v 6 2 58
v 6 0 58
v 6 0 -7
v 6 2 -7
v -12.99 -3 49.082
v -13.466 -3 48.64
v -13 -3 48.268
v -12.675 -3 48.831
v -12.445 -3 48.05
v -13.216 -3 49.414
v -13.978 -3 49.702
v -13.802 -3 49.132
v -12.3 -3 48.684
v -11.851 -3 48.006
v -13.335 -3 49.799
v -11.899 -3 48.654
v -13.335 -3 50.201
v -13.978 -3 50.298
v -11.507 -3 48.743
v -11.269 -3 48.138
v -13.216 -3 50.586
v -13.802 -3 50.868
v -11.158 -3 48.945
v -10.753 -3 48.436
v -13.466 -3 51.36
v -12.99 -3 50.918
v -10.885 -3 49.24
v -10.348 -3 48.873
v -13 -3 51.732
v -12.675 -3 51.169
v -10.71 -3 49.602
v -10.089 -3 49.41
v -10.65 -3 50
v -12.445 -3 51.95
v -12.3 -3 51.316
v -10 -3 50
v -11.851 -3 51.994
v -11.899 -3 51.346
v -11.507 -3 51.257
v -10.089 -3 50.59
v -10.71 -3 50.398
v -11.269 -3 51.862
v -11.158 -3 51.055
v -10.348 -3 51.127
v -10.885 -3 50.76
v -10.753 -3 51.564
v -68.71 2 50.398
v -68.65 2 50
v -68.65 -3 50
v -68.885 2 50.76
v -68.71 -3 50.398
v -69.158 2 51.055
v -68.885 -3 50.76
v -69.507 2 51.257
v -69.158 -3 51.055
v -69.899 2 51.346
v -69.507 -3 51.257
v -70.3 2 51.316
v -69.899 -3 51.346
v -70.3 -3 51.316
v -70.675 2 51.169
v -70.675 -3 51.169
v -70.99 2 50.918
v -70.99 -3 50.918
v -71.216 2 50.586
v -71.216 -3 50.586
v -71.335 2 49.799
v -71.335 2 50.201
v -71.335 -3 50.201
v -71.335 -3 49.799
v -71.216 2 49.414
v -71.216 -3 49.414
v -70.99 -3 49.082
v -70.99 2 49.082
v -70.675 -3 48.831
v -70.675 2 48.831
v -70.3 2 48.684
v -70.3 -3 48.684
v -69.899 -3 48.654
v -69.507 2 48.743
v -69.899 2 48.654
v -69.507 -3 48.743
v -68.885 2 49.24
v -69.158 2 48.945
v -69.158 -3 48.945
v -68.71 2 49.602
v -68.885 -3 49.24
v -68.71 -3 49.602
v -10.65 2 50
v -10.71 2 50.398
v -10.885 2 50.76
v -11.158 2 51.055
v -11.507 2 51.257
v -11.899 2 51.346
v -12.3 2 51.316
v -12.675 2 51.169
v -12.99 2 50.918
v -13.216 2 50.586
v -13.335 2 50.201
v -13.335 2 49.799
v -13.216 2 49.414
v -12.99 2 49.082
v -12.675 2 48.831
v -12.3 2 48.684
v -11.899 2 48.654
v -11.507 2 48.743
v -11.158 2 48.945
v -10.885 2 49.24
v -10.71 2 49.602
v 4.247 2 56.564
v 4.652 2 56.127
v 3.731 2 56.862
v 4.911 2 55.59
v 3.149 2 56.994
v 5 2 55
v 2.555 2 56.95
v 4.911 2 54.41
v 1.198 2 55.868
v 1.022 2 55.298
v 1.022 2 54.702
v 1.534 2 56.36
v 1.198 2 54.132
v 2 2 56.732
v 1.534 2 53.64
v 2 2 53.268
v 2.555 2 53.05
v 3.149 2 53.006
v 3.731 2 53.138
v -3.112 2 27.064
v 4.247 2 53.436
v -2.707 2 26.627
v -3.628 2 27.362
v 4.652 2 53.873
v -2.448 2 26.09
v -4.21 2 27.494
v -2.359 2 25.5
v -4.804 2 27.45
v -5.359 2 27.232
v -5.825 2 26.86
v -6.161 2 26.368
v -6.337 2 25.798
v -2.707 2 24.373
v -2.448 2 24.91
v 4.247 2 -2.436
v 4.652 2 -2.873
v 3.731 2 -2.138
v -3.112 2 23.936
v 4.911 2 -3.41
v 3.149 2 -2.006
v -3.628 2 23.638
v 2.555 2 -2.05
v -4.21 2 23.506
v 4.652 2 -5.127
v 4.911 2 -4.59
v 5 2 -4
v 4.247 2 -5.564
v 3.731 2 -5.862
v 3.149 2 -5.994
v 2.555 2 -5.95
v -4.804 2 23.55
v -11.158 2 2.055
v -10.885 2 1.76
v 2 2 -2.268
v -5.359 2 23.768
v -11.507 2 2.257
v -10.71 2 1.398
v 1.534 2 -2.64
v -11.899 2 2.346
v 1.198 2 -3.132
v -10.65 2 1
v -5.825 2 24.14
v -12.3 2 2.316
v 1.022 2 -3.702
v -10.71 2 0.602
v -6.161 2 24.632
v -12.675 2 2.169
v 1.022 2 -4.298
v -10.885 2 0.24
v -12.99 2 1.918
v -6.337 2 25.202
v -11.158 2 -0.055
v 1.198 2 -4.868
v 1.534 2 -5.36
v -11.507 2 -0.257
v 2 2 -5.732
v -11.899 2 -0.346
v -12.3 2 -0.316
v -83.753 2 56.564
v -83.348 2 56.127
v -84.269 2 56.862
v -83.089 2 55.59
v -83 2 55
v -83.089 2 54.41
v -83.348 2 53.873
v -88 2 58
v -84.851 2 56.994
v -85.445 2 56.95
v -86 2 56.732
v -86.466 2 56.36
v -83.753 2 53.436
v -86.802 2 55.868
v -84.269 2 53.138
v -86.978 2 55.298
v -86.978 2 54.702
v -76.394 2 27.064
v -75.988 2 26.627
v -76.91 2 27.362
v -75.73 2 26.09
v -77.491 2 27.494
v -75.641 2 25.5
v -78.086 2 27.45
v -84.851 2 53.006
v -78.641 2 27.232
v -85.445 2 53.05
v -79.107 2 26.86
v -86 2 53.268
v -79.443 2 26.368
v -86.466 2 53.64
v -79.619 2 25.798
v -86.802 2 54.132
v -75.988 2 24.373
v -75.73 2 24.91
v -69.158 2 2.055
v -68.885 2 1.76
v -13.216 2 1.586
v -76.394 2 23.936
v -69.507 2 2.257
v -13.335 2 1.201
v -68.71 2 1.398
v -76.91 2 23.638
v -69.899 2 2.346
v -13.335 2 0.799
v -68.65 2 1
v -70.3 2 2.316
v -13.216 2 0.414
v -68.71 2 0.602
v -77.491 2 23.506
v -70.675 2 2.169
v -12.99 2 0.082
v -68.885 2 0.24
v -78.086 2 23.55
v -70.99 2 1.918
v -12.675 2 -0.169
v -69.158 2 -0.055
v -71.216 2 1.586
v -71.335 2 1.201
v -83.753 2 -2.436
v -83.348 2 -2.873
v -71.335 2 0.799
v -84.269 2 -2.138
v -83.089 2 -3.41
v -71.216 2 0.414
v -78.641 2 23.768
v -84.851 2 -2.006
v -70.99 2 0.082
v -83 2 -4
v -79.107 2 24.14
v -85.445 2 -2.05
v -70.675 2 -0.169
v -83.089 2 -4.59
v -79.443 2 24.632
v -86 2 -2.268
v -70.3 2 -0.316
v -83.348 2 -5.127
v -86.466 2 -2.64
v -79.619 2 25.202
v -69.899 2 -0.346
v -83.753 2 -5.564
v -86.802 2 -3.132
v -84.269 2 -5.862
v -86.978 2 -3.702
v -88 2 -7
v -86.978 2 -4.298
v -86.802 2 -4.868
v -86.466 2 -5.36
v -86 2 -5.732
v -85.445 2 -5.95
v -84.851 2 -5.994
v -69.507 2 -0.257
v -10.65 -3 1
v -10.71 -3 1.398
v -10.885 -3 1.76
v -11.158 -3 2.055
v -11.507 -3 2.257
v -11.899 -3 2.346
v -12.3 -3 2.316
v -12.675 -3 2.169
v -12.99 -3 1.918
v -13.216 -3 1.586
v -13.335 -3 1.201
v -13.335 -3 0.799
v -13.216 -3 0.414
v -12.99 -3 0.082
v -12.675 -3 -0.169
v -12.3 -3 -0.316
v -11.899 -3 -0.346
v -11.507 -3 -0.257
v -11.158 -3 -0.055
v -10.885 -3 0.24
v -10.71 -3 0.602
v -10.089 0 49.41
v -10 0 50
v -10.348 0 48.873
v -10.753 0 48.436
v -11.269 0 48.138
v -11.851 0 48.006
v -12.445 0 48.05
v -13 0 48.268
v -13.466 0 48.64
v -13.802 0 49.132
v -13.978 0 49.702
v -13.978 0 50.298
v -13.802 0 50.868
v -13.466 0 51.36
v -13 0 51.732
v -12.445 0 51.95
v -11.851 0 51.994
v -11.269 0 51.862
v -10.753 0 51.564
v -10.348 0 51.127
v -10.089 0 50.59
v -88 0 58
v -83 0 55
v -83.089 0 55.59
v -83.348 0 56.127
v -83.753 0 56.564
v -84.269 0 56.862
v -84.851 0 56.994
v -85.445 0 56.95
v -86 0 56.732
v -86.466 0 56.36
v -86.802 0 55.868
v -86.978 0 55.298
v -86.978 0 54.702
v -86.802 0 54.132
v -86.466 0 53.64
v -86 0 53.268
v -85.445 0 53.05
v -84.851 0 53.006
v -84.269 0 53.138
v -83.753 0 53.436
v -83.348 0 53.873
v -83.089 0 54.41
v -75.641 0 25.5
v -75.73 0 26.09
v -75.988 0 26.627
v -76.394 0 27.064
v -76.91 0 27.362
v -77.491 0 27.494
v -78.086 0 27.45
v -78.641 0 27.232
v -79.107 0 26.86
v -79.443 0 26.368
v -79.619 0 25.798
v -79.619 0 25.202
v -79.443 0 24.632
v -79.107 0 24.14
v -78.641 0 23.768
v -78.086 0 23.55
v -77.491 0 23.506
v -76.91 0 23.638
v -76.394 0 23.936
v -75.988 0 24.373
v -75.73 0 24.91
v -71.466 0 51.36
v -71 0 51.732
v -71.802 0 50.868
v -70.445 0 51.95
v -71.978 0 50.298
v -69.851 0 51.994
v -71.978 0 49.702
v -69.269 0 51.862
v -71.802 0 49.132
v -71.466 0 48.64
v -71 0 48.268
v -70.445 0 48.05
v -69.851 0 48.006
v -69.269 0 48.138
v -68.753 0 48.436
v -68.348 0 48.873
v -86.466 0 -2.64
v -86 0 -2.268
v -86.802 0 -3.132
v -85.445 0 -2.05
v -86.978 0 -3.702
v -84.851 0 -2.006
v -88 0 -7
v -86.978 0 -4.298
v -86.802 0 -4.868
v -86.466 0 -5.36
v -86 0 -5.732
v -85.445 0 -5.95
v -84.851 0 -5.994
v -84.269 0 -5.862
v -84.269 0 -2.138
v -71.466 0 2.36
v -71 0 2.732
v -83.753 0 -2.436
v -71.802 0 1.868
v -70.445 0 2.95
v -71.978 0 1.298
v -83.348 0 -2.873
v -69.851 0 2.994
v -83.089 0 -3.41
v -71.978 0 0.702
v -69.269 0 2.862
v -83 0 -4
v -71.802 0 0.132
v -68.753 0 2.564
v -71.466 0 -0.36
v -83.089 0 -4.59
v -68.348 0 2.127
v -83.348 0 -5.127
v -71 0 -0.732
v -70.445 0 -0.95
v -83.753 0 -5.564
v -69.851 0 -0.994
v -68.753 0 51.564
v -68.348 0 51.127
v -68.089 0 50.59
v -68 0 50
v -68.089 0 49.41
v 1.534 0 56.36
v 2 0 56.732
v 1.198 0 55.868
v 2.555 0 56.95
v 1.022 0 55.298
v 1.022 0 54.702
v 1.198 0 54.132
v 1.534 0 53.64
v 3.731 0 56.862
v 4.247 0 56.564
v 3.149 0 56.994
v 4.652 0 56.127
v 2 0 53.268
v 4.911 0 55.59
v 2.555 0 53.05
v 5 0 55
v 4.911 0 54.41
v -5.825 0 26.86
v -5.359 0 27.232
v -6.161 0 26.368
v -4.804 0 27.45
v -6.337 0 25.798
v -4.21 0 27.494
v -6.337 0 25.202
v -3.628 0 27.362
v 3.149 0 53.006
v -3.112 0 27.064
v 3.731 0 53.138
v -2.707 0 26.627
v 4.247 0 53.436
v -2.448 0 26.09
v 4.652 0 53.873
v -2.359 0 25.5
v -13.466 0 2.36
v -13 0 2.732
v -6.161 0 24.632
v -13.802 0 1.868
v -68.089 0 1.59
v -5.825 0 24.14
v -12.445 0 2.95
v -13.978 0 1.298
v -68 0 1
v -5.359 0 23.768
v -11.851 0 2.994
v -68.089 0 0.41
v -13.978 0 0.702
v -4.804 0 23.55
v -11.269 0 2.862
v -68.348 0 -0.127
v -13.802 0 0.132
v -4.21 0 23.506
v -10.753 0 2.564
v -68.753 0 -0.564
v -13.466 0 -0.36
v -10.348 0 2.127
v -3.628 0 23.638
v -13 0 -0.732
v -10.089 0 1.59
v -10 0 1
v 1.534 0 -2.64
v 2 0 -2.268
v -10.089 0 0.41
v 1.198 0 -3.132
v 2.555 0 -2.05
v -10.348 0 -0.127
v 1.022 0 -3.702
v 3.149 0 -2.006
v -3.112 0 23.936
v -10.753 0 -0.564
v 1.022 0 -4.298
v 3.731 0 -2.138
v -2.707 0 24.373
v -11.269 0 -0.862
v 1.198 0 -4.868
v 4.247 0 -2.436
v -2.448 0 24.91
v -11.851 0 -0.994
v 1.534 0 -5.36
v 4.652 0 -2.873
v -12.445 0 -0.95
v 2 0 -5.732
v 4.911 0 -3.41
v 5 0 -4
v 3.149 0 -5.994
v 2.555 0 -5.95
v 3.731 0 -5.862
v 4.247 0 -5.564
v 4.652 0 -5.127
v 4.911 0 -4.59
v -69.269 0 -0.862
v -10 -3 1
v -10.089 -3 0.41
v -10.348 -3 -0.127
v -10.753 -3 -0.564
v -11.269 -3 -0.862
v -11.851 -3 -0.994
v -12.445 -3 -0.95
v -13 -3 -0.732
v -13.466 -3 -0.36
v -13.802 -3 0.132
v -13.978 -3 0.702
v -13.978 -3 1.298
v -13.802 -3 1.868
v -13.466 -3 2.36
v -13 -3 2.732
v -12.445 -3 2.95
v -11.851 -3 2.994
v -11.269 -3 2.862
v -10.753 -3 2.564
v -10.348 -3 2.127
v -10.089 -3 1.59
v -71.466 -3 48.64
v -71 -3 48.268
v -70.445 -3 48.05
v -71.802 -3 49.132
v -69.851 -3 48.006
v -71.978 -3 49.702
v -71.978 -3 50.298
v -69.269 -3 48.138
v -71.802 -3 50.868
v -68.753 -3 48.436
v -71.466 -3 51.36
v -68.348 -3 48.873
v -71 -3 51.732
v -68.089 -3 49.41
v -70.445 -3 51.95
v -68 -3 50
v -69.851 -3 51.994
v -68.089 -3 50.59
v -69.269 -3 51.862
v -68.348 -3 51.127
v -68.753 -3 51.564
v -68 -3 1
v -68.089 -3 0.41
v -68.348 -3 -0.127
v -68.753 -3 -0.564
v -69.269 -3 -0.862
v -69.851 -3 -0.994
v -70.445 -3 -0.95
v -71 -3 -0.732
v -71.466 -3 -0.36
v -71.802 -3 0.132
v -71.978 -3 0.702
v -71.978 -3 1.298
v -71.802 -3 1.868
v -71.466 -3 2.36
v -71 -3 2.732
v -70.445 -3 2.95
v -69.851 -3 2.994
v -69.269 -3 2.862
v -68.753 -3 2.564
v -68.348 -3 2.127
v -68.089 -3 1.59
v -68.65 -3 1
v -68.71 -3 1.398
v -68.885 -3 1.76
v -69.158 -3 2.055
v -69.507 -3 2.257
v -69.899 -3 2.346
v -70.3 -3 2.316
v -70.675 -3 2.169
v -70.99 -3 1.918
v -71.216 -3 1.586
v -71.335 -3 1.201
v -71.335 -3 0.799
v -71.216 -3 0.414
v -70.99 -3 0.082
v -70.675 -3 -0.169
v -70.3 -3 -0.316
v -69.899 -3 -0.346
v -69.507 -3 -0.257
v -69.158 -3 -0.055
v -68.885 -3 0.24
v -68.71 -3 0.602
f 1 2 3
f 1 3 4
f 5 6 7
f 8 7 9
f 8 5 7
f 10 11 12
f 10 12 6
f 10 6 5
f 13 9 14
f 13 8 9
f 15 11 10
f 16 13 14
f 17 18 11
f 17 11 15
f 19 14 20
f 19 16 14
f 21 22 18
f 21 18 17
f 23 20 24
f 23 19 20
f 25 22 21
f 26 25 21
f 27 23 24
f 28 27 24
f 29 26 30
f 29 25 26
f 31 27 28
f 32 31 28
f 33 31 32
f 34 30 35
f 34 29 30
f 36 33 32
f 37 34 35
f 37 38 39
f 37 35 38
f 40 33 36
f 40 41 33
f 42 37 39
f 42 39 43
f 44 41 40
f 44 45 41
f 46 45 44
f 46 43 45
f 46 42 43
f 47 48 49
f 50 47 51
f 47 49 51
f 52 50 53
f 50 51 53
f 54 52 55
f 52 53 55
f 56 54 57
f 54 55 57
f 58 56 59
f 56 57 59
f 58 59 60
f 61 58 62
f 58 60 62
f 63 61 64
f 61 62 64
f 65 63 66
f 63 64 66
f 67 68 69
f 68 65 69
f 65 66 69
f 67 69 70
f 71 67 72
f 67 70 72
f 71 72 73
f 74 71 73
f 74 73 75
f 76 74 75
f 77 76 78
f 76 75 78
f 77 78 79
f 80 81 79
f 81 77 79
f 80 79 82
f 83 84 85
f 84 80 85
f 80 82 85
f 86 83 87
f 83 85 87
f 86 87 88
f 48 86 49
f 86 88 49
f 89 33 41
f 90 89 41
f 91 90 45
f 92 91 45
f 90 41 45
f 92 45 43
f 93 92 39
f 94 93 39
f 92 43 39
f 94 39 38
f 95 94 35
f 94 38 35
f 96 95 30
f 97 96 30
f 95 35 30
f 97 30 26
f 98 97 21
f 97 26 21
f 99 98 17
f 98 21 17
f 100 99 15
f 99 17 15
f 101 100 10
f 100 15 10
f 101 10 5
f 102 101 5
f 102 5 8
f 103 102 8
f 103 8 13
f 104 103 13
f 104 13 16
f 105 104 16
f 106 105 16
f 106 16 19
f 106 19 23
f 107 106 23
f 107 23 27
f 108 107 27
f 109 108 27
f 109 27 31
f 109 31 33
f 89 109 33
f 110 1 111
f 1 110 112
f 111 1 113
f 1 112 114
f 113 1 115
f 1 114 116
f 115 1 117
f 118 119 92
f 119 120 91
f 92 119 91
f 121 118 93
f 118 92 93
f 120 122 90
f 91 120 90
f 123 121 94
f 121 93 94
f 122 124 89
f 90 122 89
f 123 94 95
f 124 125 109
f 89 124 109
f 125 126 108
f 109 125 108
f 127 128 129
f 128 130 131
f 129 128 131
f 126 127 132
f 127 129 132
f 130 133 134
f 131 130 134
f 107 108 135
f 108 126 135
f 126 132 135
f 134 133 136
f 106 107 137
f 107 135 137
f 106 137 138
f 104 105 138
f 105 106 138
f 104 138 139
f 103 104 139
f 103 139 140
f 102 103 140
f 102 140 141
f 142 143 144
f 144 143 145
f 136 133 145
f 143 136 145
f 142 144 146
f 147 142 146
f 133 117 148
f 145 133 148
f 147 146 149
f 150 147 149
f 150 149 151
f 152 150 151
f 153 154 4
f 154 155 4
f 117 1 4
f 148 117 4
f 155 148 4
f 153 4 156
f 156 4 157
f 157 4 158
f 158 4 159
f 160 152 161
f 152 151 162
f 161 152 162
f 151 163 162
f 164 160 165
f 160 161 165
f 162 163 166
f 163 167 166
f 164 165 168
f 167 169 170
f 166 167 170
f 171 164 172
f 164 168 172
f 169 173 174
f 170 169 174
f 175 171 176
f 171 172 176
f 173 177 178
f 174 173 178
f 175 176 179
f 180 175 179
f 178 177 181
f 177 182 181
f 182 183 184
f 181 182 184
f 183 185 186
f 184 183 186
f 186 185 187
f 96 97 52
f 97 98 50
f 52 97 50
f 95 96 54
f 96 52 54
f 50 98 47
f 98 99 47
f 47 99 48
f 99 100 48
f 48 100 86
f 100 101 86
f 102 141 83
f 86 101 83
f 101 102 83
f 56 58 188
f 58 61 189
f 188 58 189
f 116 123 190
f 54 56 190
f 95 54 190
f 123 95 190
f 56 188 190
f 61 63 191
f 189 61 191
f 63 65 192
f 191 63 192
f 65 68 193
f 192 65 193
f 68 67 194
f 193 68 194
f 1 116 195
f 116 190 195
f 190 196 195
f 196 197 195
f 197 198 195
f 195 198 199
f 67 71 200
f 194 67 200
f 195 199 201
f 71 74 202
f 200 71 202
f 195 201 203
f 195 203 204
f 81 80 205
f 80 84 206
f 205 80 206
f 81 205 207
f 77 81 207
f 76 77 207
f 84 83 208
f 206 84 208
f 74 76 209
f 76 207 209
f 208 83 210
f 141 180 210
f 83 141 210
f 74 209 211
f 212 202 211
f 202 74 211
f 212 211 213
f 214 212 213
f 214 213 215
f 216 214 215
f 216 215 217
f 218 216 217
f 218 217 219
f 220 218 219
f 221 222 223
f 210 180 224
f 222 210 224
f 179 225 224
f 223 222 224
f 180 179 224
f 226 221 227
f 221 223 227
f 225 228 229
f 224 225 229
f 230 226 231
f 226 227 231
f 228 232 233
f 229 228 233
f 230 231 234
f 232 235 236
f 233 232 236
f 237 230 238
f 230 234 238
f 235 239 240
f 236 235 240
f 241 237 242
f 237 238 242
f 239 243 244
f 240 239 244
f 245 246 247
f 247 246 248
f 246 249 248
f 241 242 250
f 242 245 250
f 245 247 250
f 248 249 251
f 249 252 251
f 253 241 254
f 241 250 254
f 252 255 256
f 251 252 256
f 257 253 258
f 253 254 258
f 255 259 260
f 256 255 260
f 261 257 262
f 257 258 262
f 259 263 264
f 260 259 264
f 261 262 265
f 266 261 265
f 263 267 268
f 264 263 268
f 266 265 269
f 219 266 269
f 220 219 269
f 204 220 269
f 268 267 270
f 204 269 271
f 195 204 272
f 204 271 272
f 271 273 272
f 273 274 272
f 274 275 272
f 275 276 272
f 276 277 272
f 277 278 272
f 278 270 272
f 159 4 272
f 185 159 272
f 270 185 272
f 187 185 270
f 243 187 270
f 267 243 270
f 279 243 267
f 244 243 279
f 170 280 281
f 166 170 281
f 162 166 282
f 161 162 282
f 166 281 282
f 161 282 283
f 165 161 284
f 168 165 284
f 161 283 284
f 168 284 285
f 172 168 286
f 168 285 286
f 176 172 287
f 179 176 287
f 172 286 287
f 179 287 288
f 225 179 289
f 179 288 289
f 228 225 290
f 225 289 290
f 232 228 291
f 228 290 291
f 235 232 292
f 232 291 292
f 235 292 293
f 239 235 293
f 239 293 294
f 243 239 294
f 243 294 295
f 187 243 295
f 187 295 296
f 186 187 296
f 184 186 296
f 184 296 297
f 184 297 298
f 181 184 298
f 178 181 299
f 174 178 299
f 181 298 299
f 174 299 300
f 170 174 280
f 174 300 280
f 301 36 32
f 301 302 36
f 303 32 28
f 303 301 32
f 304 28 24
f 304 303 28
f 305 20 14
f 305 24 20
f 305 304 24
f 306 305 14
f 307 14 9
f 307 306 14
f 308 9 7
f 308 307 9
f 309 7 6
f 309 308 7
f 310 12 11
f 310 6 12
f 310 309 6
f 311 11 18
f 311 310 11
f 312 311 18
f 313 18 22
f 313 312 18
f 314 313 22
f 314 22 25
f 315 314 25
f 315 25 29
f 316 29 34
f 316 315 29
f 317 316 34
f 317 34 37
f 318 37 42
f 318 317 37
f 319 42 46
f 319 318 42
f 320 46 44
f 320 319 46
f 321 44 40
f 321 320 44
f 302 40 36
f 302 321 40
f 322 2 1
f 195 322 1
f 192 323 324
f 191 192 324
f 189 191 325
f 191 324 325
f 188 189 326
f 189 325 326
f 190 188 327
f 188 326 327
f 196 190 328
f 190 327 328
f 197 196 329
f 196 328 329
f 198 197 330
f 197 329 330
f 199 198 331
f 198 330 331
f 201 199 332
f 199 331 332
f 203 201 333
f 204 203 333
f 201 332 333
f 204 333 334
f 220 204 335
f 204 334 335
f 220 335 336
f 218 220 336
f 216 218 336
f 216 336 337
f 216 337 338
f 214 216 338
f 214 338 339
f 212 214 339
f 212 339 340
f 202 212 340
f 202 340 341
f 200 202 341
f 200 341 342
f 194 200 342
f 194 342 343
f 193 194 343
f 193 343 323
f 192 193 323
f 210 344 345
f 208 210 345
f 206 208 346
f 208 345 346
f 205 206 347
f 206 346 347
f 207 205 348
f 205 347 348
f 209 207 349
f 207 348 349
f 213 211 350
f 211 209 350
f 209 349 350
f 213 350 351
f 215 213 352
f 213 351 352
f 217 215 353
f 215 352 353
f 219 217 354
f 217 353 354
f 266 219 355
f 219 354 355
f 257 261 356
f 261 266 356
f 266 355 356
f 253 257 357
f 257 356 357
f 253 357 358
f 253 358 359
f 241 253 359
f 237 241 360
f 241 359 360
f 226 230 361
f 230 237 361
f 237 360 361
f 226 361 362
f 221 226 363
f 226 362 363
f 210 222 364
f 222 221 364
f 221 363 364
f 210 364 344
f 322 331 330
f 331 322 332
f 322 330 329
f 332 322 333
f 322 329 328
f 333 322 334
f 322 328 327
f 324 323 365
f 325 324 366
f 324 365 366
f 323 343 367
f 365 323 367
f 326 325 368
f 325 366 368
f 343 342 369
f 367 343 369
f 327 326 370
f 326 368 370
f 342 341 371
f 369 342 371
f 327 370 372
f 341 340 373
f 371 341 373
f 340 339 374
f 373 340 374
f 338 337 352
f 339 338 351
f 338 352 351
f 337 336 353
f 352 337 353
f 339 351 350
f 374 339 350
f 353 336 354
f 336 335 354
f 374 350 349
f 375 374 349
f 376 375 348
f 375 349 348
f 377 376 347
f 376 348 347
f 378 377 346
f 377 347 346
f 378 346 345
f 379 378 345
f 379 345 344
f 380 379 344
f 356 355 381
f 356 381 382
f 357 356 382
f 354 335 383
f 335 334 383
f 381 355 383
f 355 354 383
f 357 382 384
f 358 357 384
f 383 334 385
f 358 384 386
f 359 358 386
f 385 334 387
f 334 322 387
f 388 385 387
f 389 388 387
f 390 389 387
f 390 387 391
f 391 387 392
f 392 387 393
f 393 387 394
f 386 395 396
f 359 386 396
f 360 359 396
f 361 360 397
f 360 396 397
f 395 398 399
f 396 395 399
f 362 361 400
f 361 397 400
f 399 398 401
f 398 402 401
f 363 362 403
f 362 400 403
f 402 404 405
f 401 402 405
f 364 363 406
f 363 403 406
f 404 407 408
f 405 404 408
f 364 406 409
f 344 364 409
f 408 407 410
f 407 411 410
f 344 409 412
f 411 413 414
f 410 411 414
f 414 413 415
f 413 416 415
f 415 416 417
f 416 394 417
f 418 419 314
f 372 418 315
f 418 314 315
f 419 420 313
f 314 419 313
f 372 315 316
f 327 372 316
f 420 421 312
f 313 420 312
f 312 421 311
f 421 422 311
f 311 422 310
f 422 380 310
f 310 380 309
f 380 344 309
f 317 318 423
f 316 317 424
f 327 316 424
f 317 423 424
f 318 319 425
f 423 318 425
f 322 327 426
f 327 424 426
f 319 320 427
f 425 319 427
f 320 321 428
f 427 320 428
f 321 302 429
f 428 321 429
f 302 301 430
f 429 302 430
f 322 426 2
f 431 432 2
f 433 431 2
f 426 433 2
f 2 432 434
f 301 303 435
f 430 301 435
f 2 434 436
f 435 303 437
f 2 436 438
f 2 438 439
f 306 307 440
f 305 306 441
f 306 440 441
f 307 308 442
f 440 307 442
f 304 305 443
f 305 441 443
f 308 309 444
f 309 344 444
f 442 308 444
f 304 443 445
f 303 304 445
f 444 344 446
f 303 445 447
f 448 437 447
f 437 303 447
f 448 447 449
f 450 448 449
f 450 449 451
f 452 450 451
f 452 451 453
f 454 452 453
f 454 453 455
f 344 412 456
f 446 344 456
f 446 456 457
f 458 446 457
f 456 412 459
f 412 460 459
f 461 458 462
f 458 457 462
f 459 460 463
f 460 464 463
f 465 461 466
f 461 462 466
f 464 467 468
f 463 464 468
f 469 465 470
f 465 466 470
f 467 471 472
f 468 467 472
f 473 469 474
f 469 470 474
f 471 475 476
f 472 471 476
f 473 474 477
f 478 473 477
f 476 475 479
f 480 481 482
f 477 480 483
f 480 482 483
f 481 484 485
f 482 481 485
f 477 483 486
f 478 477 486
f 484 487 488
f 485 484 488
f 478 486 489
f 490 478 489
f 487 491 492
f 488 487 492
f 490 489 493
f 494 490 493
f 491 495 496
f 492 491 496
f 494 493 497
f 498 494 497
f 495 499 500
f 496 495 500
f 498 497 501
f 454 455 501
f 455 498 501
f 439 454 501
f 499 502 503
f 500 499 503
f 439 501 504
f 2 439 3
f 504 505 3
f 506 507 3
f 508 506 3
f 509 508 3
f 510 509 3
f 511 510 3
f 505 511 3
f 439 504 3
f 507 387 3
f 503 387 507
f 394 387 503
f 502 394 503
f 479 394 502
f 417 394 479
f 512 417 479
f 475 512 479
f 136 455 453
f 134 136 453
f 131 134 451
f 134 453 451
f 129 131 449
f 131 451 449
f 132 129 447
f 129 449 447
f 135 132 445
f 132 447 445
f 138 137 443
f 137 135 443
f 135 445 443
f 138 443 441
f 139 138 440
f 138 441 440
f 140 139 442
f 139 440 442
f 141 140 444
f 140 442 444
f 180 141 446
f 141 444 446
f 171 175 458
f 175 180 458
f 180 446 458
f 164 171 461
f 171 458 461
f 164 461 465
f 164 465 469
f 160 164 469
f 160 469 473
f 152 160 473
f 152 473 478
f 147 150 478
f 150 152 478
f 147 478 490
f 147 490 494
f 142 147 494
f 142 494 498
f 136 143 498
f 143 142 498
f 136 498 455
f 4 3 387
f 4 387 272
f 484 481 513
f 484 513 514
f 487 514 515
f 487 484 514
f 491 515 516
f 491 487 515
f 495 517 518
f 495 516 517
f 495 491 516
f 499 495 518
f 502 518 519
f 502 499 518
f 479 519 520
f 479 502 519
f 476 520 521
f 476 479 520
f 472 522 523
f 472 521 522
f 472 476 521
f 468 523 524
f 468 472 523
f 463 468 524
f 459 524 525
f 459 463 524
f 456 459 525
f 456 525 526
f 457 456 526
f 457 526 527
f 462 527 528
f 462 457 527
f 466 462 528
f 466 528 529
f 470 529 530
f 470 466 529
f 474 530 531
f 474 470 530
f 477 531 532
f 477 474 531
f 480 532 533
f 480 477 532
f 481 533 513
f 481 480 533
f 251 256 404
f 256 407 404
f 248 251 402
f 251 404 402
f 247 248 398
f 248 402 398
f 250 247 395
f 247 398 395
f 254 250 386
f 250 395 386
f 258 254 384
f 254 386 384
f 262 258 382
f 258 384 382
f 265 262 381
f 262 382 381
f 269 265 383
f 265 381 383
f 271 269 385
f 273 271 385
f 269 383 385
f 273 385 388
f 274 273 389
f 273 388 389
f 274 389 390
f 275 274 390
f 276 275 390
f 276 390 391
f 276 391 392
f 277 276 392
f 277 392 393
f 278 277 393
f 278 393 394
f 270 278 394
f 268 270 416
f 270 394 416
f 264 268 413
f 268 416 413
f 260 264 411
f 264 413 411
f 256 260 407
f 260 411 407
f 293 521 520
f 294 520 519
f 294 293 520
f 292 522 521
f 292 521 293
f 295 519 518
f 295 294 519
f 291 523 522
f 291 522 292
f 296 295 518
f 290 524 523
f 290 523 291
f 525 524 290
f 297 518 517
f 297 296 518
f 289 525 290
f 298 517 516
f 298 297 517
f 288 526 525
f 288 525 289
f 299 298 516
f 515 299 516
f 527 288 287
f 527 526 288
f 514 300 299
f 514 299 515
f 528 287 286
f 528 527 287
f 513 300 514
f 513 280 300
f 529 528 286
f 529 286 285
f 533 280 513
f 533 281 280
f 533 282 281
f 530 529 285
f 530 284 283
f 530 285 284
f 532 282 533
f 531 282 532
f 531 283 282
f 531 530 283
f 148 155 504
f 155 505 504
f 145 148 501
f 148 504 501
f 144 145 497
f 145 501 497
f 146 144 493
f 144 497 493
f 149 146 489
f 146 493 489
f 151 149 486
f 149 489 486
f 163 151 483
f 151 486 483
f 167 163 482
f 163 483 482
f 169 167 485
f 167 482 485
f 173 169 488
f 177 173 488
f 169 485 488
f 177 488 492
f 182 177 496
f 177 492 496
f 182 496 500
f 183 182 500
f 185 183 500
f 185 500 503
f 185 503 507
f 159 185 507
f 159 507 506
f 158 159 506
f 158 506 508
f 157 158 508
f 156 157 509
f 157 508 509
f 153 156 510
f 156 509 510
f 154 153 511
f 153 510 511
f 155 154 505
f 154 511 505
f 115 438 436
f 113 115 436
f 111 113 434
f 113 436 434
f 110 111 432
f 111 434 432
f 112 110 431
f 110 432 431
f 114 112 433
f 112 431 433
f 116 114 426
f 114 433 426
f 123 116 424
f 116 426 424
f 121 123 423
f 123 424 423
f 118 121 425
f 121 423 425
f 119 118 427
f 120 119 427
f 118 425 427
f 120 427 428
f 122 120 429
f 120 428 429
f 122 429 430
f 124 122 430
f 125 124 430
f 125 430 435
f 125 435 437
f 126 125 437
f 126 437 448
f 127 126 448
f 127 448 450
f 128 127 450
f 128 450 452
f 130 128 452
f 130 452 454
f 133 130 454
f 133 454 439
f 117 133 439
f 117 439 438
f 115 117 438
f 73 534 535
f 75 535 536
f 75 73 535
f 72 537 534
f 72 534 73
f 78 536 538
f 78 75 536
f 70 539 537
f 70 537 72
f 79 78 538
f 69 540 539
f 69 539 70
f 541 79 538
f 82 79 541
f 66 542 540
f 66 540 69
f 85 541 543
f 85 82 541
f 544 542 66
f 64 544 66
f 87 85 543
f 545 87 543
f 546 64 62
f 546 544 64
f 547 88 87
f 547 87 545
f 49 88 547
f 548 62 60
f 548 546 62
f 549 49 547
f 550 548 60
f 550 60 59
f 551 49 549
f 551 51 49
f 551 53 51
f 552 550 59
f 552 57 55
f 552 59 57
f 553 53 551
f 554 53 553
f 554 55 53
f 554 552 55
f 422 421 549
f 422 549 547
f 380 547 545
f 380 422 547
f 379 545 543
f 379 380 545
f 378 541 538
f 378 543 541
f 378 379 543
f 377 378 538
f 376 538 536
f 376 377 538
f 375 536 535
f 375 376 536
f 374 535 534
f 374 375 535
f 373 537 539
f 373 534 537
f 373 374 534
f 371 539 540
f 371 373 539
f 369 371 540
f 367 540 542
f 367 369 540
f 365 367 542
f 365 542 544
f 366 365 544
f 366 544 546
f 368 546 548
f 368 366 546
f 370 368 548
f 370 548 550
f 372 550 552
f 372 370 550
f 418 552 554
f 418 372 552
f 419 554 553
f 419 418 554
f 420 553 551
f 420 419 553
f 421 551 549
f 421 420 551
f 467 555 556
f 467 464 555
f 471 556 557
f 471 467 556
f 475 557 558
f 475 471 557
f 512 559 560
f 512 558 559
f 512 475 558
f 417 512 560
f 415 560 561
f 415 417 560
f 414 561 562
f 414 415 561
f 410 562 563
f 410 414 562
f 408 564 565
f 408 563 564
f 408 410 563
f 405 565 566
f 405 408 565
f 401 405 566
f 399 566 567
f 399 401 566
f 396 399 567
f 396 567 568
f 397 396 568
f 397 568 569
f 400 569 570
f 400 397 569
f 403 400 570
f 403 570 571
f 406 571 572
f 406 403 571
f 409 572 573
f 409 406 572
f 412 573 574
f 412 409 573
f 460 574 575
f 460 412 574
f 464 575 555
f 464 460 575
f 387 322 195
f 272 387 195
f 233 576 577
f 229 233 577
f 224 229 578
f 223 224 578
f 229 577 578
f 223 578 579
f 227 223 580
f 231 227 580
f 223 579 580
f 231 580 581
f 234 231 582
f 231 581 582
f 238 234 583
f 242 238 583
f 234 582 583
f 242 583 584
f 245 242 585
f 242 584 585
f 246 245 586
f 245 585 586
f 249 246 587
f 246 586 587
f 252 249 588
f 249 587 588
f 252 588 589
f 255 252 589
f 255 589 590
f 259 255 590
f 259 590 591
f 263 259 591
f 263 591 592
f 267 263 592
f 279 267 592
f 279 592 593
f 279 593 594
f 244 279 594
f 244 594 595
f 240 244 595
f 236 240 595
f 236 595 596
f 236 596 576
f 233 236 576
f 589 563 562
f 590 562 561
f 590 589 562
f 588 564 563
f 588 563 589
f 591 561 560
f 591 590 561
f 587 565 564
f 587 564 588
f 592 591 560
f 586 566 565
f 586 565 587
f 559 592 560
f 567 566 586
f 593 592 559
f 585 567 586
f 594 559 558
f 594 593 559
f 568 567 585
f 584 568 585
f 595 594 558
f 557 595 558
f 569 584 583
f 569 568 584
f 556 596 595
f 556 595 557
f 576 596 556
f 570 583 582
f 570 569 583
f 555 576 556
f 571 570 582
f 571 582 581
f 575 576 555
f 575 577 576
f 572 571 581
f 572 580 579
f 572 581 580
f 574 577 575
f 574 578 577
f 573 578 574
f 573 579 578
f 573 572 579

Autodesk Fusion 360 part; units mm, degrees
sketch "Sketch1" plane through (0, 0, 0) normal (0, 1, 0) x (1, 0, 0)
  line L0 (-70, -50) -> (-12, -50)
  line L1 (-12, -50) -> (-12, -1)
  line L2 (-12, -1) -> (-70, -1)
  line L3 (-70, -1) -> (-70, -50)
  circle A0 centre (-70, -50) radius 1.35
  circle A1 centre (-12, -50) radius 1.35
  circle A2 centre (-70, -1) radius 1.35
  circle A3 centre (-12, -1) radius 1.35
  line L4 (-41, -50) -> (-41, -25.5)
  line L5 (0, -53) -> (-82, -53)
  line L6 (-82, -53) -> (-82, 2)
  line L7 (-82, 2) -> (0, 2)
  line L8 (0, 2) -> (0, -53)
  line L9 (0, -53) -> (-82, 2) construction
  line L10 (-82, -53) -> (0, 2) construction
  circle A4 centre (-77.6409, -25.5) radius 2
  circle A5 centre (-4.3591, -25.5) radius 2
  point P0 (-41, -25.5)
  dimension "d1" = 58
  dimension "d2" = 49
  dimension "d3" = 2.7
  dimension "d4" = 2.7
  dimension "d5" = 2.7
  dimension "d6" = 2.7
  dimension "d7" = 4
extrude "Extrude1" add sketch "Sketch1" along normal blind 2 contours L0 L1 L2 L3 A0 A1 A2 A3 | L5 L6 L7 L8
sketch "Sketch2" plane through (0, 0, 0) normal (0, -1, 0) x (1, 0, 0)
  circle A0 centre (-4.3591, 25.5) radius 2
  circle A1 centre (-70, 50) radius 1.35
  circle A2 centre (-77.6409, 25.5) radius 2
  circle A3 centre (-12, 50) radius 1.35
  circle A4 centre (-70, 1) radius 1.35
  circle A5 centre (-12, 1) radius 1.35
  line L0 (-82, -2) -> (0, -2)
  line L1 (0, -2) -> (0, 53)
  line L2 (0, 53) -> (-82, 53)
  line L3 (-82, 53) -> (-82, -2)
  circle A6 centre (-12, 50) radius 3
  circle A7 centre (-12, 50) radius 1.35
  circle A8 centre (-12, 1) radius 1.35
  circle A9 centre (-12, 1) radius 2
  circle A10 centre (-70, 1) radius 1.35
  circle A11 centre (-70, 1) radius 2
  circle A12 centre (-70, 50) radius 1.35
  circle A13 centre (-70, 50) radius 2
  circle A14 centre (-12, 50) radius 2
  dimension "d10" = 4
  dimension "d11" = 4
  dimension "d12" = 4
extrude "Extrude2" add sketch "Sketch2" along normal blind 3 contours A9 | A11 | A13 | A14
extrude "Extrude3" add 1 faces at (0, 0.6667, 16.3333) along direction (1, 0, 0) blind 6
extrude "Extrude4" add 1 faces at (-82, 0.6667, 34.6667) along direction (-1, 0, 0) blind 6
extrude "Extrude5" add 1 faces at (-25.3333, 0.6667, -2) along direction (0, 0, -1) blind 5
extrude "Extrude6" add 1 faces at (-25.3333, 0.6667, 53) along direction (0, 0, 1) blind 5
sketch "Sketch3" plane through (0, 0, 0) normal (0, -1, 0) x (1, 0, 0)
  circle A0 centre (-12, 1) radius 2
  circle A1 centre (-12, 50) radius 2
  circle A2 centre (-70, 1) radius 2
  circle A3 centre (-70, 50) radius 2
  circle A4 centre (-4.3591, 25.5) radius 2
  circle A5 centre (-77.6409, 25.5) radius 2
  line L0 (6, -7) -> (6, 58)
  line L1 (6, 58) -> (-88, 58)
  line L2 (-88, 58) -> (-88, -7)
  line L3 (-88, -7) -> (6, -7)
  circle A6 centre (-85, 55) radius 2
  line L4 (-41, 58) -> (-41, 35)
  line L5 (-88, 25.5) -> (-67.9088, 25.5)
  circle A7 centre (3, 55) radius 2
  circle A8 centre (-85, -4) radius 2
  circle A9 centre (3, -4) radius 2
extrude "Extrude7" cut sketch "Sketch3" against normal blind 15 contours A6 | A7 | A8 | A9
